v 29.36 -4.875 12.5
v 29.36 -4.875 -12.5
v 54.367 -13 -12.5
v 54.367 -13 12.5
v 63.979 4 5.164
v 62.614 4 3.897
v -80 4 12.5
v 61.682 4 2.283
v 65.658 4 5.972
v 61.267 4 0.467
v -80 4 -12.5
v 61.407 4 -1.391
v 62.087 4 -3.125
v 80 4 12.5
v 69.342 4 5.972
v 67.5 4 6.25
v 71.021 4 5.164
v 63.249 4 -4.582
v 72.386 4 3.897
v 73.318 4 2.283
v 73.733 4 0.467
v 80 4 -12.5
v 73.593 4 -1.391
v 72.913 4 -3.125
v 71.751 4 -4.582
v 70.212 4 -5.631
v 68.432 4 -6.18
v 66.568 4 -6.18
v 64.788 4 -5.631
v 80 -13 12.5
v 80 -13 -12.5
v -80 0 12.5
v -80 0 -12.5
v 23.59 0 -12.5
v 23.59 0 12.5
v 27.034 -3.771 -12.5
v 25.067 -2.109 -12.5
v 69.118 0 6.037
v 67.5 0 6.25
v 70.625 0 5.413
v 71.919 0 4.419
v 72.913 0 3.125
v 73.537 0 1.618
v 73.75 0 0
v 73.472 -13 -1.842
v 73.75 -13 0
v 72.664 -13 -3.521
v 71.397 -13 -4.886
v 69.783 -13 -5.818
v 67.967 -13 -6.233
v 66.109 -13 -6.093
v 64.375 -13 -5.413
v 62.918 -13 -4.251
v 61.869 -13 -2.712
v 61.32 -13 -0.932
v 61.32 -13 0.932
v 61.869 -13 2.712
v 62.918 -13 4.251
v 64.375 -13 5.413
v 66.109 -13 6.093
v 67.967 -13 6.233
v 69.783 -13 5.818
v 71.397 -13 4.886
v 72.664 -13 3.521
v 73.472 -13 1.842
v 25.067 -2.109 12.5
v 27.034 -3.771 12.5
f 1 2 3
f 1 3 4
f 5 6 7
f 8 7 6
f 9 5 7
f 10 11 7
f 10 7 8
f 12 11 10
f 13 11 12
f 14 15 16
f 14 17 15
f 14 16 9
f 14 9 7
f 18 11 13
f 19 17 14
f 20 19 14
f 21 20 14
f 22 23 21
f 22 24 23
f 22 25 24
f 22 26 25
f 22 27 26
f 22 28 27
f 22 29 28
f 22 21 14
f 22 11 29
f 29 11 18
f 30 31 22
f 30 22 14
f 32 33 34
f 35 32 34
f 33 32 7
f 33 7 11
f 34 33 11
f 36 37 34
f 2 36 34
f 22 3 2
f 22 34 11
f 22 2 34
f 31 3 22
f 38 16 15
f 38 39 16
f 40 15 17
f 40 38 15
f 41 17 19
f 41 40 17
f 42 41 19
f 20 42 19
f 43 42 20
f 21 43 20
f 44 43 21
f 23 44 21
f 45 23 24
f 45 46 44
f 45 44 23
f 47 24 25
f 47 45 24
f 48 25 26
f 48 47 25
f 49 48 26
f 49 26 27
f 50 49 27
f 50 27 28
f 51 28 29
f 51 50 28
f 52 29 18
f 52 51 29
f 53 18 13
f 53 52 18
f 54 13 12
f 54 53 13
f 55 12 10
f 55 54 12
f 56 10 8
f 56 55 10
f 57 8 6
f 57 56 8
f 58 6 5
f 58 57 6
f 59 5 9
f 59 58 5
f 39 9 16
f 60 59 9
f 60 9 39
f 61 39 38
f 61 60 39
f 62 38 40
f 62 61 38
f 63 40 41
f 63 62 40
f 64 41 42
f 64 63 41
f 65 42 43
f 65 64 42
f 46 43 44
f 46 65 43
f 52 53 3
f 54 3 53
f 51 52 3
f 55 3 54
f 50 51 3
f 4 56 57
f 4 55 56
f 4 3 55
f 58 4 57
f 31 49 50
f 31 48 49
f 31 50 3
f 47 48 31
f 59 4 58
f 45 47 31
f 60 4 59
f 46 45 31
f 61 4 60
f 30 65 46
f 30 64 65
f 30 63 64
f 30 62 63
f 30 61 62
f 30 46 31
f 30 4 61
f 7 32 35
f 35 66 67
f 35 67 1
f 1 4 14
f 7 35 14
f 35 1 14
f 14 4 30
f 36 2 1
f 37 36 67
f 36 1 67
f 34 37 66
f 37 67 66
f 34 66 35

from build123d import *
from build123d.topology import SkipClean

# Parameters (mm, degrees)
SKETCH1_W           = 160
SKETCH1_H           = 25
SKETCH1_R           = 6.25
BOSS_EXTRUDE1_DEPTH = 4
BOSS_EXTRUDE2_START = 13
SKETCH2_W           = 56.41
SKETCH2_H           = 25
SKETCH2_R           = 6.25
BOSS_EXTRUDE2_DEPTH = 13
CHAMFER1_SIZE       = 10
CHAMFER1_SIZE2      = 30.776835372
FILLET1_R           = 10


with BuildPart() as part:
    # Sketch1 → Boss-Extrude1 (new body)
    with BuildSketch(Plane(origin=(0, 0, 0), x_dir=(1, 0, 0), z_dir=(0, 1, 0))):
        Rectangle(SKETCH1_W, SKETCH1_H)
        with Locations(Location((67.5, 0, 0), (0, 0, 270))):
            Circle(SKETCH1_R, mode=Mode.SUBTRACT)
    extrude(amount=BOSS_EXTRUDE1_DEPTH)

    # Sketch2 → Boss-Extrude2 (add)
    with SkipClean():  # the faces are left unmerged after this step: merging them gives an invalid solid
        with BuildSketch(Plane.XZ.offset(BOSS_EXTRUDE2_START)):
            with Locations((51.795, 0)):
                Rectangle(SKETCH2_W, SKETCH2_H)
            with Locations((67.5, 0)):
                Circle(SKETCH2_R, mode=Mode.SUBTRACT)
        extrude(amount=-BOSS_EXTRUDE2_DEPTH)

    # Chamfer1
    chamfer1_edges = [part.edges().sort_by_distance(p)[0] for p in [
        (23.59, -13, 0),
    ]]
    chamfer1_side = [part.faces().sort_by_distance(p)[0] for p in [
        (23.59, -6.5, 0),
    ]]
    chamfer(chamfer1_edges, length=CHAMFER1_SIZE, length2=CHAMFER1_SIZE2, reference=chamfer1_side[0])

    # Fillet1
    # the kernel refuses this fillet: 10 mm, written as the material it takes off along each edge
    with BuildSketch(Plane(origin=(23.59, -3, 27.668583986), x_dir=(0.9510565162951544, -0.3090169943749446, 0), z_dir=(0, 0, -1))) as fillet1_piece_1:
        with BuildLine():
            CenterArc((6.067433594, -10), FILLET1_R, 90, 44.38277042)
            Line((-0.927050983, -2.853169549), (-1.066940675, -2.71023294))
            ThreePointArc((-1.066940675, -2.71023294), (-0.653736795, -1.364781376), (-0.190211303, 0.061803399))
            Line((-0.190211303, 0.061803399), (0, 0.2))
            Line((0, 0.2), (6.067433594, 0.2))
            Line((6.067433594, 0.2), (6.067433594, 0))
        make_face()
    extrude(amount=55.337167971, mode=Mode.SUBTRACT)


solid = part.part
